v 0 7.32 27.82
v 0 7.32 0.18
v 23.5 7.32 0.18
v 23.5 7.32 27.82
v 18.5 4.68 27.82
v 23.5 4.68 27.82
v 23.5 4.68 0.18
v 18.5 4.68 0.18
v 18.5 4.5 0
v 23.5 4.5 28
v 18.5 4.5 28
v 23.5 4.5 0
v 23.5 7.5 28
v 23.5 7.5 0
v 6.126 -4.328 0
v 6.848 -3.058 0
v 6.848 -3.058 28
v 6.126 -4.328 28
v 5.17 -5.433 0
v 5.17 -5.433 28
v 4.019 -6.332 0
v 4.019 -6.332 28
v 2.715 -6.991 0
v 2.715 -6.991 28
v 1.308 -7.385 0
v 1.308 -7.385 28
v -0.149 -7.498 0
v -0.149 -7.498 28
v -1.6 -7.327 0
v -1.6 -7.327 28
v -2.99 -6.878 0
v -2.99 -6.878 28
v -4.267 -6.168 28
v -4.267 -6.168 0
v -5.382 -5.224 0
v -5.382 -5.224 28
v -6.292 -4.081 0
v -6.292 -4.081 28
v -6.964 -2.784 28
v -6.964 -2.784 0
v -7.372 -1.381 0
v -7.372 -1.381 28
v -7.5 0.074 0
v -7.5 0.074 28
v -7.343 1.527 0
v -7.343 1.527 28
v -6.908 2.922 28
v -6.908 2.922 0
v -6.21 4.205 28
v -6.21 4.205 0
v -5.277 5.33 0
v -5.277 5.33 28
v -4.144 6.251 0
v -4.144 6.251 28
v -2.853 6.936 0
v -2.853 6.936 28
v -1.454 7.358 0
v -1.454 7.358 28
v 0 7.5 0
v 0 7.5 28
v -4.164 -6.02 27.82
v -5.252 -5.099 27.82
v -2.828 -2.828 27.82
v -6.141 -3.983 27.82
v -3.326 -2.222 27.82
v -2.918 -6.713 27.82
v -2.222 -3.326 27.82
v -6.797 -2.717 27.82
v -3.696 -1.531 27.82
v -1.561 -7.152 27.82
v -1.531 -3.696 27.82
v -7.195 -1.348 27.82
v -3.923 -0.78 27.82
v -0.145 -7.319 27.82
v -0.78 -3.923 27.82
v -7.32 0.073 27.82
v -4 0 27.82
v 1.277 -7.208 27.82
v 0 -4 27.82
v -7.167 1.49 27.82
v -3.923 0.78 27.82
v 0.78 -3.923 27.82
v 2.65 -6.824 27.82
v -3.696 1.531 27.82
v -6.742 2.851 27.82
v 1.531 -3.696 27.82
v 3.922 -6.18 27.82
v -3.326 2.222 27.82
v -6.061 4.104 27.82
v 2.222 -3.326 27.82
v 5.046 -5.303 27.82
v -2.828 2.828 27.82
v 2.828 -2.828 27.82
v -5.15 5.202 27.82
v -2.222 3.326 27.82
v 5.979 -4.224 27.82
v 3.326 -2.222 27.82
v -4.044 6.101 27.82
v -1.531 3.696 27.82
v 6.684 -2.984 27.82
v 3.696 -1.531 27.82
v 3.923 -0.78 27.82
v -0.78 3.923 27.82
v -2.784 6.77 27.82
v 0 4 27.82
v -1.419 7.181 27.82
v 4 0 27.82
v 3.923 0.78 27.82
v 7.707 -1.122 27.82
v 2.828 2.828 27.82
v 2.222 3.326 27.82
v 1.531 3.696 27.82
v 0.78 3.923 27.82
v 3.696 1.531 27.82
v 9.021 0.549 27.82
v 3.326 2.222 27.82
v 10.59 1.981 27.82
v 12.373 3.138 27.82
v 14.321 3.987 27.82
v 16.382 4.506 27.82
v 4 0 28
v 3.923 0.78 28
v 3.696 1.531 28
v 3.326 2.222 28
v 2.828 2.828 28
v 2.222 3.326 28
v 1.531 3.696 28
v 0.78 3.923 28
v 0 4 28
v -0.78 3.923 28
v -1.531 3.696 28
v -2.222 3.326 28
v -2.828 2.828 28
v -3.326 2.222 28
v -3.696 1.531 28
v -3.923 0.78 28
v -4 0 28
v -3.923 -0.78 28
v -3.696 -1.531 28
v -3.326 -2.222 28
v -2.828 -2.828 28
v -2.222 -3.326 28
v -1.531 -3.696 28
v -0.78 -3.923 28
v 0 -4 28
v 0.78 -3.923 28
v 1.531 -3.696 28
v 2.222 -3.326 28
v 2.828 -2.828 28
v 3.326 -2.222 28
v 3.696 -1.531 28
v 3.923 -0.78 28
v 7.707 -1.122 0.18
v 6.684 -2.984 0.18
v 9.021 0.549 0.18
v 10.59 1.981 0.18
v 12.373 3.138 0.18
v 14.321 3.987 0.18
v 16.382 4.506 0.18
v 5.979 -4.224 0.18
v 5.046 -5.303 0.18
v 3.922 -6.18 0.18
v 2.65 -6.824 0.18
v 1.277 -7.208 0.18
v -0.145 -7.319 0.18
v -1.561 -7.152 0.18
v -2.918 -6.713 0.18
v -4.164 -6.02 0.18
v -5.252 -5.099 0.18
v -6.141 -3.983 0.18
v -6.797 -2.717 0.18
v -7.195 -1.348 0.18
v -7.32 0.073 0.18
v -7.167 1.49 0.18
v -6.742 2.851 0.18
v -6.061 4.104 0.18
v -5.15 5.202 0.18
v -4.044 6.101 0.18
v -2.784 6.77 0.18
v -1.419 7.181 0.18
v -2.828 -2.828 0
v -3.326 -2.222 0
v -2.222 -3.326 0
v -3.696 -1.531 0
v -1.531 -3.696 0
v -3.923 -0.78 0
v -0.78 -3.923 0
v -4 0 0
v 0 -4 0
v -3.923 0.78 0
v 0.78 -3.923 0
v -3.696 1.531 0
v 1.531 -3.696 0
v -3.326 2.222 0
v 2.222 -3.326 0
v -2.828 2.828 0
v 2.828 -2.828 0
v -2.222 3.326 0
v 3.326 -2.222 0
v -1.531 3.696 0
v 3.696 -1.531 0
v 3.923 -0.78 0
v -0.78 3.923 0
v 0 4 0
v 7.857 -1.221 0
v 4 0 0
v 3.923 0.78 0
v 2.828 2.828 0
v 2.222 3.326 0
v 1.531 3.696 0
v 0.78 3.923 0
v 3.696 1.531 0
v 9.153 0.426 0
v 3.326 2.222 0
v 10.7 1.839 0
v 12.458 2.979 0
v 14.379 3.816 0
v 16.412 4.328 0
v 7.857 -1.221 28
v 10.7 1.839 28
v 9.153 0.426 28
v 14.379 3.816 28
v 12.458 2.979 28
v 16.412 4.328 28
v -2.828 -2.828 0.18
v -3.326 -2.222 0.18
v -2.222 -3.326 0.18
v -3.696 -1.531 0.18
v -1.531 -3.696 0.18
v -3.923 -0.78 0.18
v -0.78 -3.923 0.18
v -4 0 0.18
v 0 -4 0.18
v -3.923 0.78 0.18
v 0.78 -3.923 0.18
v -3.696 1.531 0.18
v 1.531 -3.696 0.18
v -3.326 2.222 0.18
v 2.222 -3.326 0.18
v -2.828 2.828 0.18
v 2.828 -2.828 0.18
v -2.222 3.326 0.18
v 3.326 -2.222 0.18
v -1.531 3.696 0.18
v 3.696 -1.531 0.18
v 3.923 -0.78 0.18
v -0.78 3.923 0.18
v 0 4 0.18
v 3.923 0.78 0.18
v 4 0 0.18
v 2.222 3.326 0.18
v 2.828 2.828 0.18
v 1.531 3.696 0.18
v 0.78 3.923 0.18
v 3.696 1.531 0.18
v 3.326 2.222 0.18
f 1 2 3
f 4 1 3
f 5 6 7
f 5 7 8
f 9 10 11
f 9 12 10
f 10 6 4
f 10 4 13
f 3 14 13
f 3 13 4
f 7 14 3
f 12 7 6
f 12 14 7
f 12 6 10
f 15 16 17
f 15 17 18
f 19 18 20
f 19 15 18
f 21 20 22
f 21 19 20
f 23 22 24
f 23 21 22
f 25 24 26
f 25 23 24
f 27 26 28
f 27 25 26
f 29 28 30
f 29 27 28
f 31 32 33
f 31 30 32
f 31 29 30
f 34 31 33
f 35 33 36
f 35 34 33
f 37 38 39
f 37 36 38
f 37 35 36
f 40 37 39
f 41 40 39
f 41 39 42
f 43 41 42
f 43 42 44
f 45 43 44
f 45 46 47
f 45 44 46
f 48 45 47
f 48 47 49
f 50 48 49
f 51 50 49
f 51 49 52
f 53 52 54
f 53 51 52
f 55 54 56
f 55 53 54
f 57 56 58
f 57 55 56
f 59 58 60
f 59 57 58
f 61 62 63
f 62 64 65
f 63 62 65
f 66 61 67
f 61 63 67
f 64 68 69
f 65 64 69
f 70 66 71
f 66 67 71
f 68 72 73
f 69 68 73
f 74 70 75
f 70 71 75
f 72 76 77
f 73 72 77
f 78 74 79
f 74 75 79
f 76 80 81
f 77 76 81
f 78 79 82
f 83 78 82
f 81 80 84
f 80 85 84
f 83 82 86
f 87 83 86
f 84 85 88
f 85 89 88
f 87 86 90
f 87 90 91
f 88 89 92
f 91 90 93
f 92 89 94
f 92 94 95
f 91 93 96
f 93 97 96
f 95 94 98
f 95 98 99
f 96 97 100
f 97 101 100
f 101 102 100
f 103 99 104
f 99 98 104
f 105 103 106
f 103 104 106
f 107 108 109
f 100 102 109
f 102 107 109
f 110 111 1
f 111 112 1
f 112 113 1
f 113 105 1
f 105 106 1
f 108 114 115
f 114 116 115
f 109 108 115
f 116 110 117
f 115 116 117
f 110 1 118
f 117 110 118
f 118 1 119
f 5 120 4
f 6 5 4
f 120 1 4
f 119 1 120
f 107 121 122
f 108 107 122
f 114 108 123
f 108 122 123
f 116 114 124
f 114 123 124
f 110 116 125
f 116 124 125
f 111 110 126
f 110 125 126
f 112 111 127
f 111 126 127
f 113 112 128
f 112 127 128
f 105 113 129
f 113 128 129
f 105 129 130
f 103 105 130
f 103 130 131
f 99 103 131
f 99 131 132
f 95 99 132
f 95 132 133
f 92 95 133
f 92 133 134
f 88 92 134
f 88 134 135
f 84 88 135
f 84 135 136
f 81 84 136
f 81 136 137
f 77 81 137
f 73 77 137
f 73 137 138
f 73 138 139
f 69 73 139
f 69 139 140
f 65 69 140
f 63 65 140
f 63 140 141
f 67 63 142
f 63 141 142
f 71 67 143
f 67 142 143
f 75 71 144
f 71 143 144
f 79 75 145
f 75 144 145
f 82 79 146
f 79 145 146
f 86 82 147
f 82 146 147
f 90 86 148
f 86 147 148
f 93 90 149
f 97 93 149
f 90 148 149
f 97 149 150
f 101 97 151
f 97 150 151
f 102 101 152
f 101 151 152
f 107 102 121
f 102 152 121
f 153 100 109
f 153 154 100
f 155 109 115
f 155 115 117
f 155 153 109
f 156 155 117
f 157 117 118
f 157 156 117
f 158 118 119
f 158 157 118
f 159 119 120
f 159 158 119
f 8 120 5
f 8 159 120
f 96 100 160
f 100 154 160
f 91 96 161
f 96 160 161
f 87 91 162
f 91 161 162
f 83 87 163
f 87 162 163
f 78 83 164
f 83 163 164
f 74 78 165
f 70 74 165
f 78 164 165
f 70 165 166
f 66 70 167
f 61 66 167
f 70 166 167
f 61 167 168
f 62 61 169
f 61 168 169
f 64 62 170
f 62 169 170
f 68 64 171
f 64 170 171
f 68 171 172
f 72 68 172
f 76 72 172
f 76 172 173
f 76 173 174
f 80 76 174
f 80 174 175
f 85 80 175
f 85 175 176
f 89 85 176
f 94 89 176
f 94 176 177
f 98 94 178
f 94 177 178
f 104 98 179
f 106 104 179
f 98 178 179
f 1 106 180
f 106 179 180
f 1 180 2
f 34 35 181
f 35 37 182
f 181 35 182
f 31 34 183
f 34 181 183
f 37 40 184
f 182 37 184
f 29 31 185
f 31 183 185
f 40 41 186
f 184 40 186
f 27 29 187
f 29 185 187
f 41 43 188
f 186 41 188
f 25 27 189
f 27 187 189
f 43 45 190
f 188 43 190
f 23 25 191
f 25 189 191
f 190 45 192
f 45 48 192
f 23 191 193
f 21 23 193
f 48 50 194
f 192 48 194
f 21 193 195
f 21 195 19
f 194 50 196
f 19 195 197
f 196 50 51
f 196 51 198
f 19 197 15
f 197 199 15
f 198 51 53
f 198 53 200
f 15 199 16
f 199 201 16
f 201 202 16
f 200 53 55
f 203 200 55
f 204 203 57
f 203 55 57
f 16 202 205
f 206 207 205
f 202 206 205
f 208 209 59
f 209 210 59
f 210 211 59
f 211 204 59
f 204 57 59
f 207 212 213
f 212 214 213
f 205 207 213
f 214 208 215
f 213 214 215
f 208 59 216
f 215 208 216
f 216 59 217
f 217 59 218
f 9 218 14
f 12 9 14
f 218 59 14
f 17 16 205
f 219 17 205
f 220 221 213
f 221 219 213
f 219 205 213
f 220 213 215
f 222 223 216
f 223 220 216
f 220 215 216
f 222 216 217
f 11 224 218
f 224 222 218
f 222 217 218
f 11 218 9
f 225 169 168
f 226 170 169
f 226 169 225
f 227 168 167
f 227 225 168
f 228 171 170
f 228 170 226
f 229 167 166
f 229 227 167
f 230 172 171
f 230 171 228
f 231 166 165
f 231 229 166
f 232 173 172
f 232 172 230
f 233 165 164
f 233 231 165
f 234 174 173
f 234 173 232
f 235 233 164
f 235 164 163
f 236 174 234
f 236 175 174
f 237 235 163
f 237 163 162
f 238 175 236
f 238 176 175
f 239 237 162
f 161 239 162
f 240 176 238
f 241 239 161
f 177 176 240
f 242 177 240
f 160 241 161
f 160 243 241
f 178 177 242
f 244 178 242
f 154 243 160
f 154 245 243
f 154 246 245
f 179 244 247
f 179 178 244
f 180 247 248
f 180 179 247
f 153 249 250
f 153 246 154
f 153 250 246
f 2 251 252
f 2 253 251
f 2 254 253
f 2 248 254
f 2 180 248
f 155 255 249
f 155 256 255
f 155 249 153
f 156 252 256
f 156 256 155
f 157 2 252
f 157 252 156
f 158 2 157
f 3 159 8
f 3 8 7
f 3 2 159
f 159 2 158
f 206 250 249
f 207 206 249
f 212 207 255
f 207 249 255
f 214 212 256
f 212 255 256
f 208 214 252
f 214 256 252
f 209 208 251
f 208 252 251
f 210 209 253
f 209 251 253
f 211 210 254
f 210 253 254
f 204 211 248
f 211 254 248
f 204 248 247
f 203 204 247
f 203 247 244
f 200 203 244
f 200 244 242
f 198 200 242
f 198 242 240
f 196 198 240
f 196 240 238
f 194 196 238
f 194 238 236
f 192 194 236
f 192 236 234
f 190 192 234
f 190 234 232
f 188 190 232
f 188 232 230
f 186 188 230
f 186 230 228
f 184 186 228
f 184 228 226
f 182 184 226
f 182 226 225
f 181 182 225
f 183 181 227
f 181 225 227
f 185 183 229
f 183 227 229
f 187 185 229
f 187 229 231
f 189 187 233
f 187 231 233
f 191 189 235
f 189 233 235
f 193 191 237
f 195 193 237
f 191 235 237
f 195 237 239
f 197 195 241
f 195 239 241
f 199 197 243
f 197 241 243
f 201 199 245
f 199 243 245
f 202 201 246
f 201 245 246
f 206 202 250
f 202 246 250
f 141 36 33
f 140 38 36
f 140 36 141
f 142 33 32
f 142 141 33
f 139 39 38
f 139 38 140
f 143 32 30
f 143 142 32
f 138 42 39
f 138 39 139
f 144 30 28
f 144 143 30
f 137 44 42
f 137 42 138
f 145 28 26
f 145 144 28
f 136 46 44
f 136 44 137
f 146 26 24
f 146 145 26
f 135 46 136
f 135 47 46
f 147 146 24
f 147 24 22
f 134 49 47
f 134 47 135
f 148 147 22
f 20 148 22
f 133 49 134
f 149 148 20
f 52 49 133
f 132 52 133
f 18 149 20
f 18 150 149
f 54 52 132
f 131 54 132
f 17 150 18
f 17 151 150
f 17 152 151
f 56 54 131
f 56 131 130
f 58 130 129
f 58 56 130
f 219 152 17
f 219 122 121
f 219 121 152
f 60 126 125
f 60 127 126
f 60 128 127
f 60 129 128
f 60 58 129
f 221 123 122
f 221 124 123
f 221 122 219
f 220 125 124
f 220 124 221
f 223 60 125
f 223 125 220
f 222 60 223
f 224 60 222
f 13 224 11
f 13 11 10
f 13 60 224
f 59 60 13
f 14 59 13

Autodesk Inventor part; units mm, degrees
ref_plane "YZ Plane" through (0, 0, 0) normal (1, 0, 0) x (0, 1, 0)
ref_plane "XZ Plane" through (0, 0, 0) normal (0, 1, 0) x (-1, 0, 0)
ref_plane "XY Plane" through (0, 0, 0) normal (0, 0, 1) x (1, 0, 0)
sketch "Sketch1" plane through (0, 0, 0) normal (0, 0, 1) x (1, 0, 0)
  arc A0 (0, 7.5) -> (6.8483, -3.0578) centre (0, 0) ccw
  line L0 (0, 7.5) -> (23.5, 7.5)
  line L1 (23.5, 7.5) -> (23.5, 4.5)
  line L2 (23.5, 4.5) -> (18.5, 4.5)
  arc A1 (18.5, 4.5) -> (6.8483, -3.0578) centre (18.5, -8.2604) ccw
  dimension "d0" = 15
  dimension "d3" = 3
  dimension "d5" = 23.5
  dimension "d12" = 5
extrude "Extrusion1" add sketch "Sketch1" along normal blind 28
shell "Shell1" thickness 0.18 removed faces 1 at (23.5, 5.5, 18.6667)
sketch "Sketch2" plane through (0, 0, 28) normal (0, 0, 1) x (1, 0, 0)
  circle A0 centre (0, 0) radius 4
  dimension "d9" = 8
extrude "Extrusion2" cut sketch "Sketch2" against normal blind 31
properties part number "blower"
